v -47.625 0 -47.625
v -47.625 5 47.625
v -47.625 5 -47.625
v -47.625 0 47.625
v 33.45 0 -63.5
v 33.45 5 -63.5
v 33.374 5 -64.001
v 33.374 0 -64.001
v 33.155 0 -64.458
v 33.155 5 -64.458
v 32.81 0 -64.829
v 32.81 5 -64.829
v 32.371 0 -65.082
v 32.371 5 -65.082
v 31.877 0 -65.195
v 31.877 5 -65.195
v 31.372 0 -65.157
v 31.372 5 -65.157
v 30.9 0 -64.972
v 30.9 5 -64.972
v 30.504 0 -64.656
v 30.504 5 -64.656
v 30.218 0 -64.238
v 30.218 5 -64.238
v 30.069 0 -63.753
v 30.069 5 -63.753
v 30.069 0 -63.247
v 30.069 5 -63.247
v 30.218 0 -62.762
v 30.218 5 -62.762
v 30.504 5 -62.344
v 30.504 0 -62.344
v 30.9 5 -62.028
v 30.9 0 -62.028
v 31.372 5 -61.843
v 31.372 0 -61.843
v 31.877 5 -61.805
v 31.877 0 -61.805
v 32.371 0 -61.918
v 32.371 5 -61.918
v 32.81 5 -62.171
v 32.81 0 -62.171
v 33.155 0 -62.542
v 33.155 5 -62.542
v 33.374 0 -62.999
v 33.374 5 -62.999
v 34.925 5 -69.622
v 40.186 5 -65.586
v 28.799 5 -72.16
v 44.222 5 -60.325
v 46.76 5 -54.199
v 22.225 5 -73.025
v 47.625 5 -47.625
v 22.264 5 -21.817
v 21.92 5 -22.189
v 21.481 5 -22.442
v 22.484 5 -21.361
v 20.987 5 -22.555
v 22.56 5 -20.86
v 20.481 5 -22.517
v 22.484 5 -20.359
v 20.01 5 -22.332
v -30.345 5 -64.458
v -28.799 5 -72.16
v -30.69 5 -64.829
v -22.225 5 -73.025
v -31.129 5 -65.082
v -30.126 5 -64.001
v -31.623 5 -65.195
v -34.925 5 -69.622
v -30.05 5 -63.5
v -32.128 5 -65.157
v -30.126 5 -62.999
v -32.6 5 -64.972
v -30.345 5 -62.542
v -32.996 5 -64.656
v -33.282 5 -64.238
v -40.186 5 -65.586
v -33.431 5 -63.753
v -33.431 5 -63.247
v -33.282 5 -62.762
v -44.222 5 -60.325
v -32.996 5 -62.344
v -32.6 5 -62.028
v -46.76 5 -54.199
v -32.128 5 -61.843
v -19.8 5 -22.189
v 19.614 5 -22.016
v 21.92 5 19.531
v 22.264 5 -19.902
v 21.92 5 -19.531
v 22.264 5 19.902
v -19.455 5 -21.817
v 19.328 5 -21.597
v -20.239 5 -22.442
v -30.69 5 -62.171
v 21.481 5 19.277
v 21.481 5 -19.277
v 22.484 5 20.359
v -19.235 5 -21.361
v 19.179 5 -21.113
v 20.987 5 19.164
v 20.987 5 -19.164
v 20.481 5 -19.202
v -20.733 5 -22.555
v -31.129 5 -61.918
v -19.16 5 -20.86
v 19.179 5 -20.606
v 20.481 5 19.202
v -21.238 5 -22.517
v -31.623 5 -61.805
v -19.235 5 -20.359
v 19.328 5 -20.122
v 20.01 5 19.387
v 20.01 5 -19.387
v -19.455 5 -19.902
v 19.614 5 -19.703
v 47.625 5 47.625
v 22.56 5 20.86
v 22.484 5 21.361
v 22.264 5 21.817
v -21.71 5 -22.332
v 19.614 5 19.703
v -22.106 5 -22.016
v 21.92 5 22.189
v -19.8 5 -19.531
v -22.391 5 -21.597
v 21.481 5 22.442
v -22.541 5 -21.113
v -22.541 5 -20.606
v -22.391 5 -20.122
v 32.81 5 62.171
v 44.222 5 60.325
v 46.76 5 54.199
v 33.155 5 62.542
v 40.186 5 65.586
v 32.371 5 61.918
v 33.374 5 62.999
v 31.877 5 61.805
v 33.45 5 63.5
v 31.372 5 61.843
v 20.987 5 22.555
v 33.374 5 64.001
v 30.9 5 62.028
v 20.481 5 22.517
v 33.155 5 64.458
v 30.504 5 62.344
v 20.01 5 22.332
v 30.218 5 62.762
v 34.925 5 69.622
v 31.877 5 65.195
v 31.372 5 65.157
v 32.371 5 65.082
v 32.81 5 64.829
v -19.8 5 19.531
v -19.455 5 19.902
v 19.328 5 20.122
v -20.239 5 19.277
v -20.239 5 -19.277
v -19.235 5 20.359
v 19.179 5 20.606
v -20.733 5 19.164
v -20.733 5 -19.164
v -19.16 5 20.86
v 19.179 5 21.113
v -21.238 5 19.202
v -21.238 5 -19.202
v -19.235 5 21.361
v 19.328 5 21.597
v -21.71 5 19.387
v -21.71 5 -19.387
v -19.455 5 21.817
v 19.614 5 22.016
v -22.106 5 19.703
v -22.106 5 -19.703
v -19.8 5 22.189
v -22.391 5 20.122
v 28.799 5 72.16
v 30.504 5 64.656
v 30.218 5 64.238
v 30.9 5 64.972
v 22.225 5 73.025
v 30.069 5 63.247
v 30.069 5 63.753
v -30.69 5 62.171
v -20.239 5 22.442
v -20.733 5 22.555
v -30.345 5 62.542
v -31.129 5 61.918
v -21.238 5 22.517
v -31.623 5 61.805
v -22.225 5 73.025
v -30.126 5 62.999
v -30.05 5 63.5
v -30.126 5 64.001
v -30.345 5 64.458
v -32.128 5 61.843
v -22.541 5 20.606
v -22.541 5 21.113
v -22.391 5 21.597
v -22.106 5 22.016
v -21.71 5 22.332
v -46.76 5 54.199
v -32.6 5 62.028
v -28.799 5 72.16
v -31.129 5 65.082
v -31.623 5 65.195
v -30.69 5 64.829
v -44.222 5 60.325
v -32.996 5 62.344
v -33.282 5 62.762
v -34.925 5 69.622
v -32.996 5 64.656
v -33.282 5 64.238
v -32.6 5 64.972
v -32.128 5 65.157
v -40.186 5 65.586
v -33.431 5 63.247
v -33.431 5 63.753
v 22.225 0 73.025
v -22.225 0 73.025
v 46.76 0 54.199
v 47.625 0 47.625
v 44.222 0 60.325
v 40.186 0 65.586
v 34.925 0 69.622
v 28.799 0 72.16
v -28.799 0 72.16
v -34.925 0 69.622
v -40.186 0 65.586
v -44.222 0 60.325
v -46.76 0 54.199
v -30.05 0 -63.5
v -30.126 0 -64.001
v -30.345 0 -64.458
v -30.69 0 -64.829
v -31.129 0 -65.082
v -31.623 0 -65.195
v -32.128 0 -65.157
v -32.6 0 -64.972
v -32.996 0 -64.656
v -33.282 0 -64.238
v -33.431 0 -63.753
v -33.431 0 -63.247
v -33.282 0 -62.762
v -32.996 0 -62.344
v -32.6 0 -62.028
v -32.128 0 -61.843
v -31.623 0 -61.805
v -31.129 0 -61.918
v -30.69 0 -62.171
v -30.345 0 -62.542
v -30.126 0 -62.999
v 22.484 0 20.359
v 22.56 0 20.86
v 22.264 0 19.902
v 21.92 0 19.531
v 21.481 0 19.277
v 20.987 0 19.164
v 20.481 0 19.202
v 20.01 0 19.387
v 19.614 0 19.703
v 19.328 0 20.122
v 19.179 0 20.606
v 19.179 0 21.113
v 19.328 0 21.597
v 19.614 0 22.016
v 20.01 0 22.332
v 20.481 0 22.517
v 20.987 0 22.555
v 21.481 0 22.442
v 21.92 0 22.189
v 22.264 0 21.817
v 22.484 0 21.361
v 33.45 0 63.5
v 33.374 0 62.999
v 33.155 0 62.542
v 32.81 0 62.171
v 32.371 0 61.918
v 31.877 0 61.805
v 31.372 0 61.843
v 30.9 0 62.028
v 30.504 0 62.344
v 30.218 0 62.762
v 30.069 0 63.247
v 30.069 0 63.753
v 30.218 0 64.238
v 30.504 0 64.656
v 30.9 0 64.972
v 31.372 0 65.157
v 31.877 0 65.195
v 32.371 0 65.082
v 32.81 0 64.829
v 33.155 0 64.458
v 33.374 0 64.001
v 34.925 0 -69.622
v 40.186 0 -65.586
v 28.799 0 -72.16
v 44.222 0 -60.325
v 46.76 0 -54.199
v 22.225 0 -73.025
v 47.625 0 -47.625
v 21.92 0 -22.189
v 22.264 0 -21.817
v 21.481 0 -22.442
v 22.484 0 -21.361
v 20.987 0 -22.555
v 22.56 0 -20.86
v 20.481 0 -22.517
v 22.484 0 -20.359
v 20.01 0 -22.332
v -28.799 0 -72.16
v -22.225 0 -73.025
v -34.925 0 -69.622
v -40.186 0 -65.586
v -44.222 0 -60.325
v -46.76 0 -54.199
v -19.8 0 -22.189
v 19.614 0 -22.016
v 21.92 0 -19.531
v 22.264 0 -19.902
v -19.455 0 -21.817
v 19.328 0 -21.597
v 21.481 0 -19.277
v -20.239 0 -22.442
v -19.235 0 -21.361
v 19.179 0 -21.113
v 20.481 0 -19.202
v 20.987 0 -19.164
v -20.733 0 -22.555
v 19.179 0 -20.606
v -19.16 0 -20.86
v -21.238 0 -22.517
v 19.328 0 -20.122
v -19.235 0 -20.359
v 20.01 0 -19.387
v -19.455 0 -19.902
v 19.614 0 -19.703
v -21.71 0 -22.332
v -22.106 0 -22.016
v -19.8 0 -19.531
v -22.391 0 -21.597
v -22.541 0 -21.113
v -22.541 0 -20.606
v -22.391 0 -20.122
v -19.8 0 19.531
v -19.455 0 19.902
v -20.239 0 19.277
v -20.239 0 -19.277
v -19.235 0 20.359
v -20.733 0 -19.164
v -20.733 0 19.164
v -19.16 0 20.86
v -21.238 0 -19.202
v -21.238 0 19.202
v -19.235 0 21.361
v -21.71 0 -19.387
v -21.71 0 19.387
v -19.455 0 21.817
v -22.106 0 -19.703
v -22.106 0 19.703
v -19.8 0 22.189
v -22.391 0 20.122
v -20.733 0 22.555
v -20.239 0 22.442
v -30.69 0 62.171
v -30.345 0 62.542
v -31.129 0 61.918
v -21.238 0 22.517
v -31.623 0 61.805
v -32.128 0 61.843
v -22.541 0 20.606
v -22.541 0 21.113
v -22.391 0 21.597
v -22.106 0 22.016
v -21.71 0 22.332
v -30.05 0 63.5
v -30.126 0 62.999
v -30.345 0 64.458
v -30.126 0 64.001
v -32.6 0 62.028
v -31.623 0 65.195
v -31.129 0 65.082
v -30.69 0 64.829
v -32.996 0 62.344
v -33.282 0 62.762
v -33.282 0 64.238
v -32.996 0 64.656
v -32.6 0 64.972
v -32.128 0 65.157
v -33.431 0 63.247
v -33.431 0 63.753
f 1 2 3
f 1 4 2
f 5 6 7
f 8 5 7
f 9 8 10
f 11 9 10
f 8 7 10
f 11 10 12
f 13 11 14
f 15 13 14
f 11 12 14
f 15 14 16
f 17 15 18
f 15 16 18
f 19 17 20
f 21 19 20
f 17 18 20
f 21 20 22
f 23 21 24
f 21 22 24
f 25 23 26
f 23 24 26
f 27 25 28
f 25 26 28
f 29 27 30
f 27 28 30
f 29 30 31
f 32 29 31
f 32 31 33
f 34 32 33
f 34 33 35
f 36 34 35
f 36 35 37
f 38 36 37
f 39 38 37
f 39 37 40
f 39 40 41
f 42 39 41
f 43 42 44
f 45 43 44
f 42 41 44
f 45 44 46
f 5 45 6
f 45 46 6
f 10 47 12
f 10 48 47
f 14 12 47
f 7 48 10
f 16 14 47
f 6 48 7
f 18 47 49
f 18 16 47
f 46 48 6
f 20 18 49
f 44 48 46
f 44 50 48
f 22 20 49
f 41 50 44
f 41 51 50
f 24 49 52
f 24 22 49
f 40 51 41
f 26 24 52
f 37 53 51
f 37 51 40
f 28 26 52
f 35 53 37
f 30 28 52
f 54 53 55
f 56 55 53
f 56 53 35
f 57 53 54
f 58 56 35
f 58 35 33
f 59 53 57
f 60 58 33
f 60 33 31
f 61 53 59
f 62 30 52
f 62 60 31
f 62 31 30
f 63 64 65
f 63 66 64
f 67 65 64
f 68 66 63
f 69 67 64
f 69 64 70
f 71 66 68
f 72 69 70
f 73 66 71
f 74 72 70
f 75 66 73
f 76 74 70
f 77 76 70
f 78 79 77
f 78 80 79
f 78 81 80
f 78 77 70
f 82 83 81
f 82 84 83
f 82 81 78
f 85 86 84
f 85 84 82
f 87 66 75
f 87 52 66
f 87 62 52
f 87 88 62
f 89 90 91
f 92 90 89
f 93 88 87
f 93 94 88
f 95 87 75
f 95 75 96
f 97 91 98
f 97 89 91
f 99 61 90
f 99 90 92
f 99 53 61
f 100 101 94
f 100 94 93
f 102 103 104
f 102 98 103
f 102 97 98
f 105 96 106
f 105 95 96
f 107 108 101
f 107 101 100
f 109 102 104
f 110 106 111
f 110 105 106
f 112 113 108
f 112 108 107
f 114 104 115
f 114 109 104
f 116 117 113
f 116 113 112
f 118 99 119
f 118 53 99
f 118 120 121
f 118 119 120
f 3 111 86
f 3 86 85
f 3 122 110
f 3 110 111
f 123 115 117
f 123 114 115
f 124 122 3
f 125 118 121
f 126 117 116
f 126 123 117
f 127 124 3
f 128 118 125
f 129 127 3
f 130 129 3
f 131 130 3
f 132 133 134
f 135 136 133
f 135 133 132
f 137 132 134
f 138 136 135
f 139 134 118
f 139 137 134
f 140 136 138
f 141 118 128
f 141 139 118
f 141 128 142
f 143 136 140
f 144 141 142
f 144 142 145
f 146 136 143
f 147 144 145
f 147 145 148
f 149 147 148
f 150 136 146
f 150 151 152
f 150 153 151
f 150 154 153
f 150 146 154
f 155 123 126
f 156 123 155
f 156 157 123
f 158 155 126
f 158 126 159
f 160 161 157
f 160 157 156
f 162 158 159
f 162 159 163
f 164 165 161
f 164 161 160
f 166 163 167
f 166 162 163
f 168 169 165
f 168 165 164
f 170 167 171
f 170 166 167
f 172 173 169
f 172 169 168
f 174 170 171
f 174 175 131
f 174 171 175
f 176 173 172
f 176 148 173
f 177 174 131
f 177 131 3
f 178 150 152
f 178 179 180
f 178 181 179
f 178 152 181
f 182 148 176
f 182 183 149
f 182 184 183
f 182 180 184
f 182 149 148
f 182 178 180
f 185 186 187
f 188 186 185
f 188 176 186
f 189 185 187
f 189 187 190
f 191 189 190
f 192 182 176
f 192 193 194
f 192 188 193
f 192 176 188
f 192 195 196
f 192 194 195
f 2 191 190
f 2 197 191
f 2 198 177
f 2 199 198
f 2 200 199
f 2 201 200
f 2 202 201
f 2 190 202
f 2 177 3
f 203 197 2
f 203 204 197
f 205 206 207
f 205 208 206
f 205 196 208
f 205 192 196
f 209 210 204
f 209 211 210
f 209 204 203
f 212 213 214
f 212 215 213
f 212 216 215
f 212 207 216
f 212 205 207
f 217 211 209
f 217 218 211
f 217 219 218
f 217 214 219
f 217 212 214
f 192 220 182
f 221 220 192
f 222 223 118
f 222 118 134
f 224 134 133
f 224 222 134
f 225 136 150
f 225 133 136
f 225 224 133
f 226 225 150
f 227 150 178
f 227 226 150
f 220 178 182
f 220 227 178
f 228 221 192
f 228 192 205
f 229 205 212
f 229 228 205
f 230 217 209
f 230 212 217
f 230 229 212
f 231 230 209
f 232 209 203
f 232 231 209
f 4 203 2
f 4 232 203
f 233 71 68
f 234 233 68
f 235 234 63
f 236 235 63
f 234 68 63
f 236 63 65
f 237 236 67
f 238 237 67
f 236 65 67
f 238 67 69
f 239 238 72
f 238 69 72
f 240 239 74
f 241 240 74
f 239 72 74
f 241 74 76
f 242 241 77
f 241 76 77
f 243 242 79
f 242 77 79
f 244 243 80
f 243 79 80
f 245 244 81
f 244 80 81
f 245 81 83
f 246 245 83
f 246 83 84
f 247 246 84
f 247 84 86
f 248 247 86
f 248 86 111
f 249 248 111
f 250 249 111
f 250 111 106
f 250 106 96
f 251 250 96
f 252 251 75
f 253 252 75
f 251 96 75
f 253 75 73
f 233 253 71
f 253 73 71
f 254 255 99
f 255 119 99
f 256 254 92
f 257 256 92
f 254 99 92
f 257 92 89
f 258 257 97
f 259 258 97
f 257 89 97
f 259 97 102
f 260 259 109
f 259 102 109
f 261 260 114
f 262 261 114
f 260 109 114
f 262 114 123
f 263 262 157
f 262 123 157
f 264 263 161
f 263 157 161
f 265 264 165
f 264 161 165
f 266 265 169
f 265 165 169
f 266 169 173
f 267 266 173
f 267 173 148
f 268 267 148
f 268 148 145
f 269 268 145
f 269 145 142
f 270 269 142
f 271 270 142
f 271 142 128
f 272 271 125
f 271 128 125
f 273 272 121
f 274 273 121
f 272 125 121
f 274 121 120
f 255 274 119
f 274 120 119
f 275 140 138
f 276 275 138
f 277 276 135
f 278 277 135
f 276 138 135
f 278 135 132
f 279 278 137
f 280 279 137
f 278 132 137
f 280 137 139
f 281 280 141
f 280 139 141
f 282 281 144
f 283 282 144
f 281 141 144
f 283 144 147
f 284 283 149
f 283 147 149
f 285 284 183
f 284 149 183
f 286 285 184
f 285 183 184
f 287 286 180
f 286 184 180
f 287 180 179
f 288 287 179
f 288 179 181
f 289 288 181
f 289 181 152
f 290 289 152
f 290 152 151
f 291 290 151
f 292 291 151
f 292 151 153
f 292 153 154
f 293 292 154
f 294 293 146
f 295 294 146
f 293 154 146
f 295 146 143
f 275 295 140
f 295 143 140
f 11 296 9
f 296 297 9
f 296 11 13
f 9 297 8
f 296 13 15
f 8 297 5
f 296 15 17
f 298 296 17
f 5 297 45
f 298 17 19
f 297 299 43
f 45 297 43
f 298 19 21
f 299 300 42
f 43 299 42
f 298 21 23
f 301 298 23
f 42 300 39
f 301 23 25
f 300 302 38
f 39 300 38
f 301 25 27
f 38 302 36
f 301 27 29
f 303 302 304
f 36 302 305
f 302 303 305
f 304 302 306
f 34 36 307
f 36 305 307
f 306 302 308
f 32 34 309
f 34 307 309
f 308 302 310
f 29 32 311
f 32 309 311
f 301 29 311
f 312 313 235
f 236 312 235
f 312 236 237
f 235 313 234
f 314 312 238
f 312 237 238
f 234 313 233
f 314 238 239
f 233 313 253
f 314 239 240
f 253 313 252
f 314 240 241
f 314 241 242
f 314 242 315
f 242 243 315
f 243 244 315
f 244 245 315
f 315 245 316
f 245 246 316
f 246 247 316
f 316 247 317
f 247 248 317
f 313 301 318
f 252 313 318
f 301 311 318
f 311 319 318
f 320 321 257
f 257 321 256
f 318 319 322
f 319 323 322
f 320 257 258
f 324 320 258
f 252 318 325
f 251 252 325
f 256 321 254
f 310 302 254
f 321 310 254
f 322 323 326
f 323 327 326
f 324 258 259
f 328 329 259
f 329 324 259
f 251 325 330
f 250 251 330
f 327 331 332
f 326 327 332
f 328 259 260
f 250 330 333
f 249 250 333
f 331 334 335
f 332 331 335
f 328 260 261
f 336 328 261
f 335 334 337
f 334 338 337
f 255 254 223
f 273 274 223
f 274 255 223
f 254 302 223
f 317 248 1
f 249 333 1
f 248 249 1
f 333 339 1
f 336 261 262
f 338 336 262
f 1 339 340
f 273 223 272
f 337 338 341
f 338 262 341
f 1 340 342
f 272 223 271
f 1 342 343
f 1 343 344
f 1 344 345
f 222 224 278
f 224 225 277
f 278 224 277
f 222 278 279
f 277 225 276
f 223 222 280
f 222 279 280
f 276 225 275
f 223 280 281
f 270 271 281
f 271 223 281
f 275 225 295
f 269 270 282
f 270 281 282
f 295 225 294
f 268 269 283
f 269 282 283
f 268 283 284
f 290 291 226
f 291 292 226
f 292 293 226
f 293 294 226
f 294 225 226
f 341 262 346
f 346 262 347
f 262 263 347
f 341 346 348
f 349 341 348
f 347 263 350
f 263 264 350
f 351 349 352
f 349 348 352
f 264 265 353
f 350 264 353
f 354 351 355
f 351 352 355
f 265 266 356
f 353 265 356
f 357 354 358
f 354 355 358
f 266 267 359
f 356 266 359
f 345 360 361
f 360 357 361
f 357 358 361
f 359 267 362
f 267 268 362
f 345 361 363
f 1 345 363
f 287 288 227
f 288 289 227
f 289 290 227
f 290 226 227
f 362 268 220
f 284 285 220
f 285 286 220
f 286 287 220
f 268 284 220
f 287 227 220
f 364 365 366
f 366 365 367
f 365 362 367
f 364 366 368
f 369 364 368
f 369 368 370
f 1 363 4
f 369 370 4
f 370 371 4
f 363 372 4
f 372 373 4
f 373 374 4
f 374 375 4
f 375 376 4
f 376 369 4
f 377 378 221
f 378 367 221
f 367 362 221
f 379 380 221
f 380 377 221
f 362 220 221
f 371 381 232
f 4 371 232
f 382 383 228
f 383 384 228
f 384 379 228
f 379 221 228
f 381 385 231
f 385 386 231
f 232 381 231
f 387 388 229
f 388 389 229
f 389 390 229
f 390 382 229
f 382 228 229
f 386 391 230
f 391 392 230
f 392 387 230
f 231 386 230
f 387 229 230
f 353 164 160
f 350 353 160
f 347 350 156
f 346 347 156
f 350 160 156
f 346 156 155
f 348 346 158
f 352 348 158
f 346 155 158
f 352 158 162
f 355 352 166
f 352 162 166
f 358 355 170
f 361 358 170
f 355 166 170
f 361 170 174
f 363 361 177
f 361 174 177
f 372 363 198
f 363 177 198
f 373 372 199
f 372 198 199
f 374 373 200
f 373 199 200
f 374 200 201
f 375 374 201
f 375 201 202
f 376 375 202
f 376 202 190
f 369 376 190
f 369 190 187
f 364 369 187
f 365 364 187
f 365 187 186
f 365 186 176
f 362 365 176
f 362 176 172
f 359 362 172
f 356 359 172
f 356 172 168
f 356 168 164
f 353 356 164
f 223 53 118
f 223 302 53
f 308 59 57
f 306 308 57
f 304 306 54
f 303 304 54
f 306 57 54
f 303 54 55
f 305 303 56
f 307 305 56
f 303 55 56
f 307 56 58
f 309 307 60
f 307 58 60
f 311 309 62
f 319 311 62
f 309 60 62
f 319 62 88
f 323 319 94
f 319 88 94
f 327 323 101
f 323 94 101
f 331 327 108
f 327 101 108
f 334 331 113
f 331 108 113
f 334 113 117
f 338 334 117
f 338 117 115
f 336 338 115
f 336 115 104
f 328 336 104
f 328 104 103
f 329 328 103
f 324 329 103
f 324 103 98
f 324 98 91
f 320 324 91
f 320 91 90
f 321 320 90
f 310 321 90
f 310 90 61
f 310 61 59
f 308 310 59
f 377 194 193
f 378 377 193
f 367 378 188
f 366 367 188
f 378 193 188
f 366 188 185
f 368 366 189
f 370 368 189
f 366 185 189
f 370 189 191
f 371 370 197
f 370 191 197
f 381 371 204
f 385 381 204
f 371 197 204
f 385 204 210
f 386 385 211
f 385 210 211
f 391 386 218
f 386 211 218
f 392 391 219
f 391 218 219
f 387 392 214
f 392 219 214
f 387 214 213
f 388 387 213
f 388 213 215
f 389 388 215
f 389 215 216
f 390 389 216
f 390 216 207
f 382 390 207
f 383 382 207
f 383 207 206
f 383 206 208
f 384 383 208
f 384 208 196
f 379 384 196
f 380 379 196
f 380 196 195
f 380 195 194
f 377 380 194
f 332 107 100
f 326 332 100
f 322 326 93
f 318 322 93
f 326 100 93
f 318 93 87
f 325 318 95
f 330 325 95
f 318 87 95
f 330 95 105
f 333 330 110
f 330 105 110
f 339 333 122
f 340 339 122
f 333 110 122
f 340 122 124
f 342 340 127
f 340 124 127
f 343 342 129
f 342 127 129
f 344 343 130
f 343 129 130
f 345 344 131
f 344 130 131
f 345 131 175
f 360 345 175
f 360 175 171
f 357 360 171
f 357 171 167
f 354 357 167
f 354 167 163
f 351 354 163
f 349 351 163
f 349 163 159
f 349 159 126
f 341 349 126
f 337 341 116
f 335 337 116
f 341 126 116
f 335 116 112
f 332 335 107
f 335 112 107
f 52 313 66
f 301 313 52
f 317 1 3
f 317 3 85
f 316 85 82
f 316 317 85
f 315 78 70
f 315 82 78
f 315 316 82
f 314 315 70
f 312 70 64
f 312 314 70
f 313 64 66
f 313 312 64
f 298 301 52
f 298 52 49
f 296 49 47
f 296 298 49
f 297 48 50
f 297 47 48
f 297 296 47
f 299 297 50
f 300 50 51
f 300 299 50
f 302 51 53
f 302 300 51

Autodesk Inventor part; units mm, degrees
ref_plane "YZ Plane" through (0, 0, 0) normal (1, 0, 0) x (0, 1, 0)
ref_plane "XZ Plane" through (0, 0, 0) normal (0, 1, 0) x (-1, 0, 0)
ref_plane "XY Plane" through (0, 0, 0) normal (0, 0, 1) x (1, 0, 0)
sketch "Sketch1" plane through (0, 0, 0) normal (0, 1, 0) x (-1, 0, 0)
  line L0 (-22.225, 73.025) -> (22.225, 73.025)
  line L1 (47.625, 47.625) -> (47.625, -47.625)
  line L2 (22.225, -73.025) -> (-22.225, -73.025)
  line L3 (-47.625, -47.625) -> (-47.625, 47.625)
  line L4 (-47.625, 73.025) -> (47.625, -73.025) construction
  line L5 (47.625, 73.025) -> (-47.625, -73.025) construction
  arc A0 (22.225, -73.025) -> (47.625, -47.625) centre (22.225, -47.625) ccw
  arc A1 (-47.625, -47.625) -> (-22.225, -73.025) centre (-22.225, -47.625) ccw
  arc A2 (-22.225, 73.025) -> (-47.625, 47.625) centre (-22.225, 47.625) ccw
  arc A3 (47.625, 47.625) -> (22.225, 73.025) centre (22.225, 47.625) ccw
  point P0 (0, 0)
  dimension "d11" = 95.25
  dimension "d12" = 146.05
  dimension "d13" = 25.4
extrude "Extrusion1" add sketch "Sketch1" along normal blind 5
sketch "Sketch3" plane through (0, 5, 0) normal (0, 1, 0) x (1, 0, 0)
  circle A0 centre (-31.75, -63.5) radius 1.7
  line L0 (-47.625, 47.625) -> (-47.625, -47.625) construction
  line L1 (-47.625, 0) -> (47.625, 0) construction
  line L2 (47.625, -47.625) -> (47.625, 47.625) construction
  line L3 (0, -72.5867) -> (0, 73.025) construction
  line L4 (22.225, 73.025) -> (-22.225, 73.025) construction
  circle A1 centre (-31.75, 63.5) radius 1.7
  circle A2 centre (31.75, -63.5) radius 1.7
  circle A3 centre (31.75, 63.5) radius 1.7
  point P0 (0, 0)
  dimension "d14" = 3.4
  dimension "d15" = 63.5
  dimension "d16" = 31.75
extrude "Standoffs" cut sketch "Sketch3" against normal through all
sketch "Sketch4" plane through (0, 5, 0) normal (0, 1, 0) x (1, 0, 0)
  circle A0 centre (-20.8597, -20.8597) radius 1.7
  line L0 (-47.625, 47.625) -> (-47.625, -47.625) construction
  line L1 (-47.625, 0) -> (47.625, 0) construction
  line L2 (47.625, -47.625) -> (47.625, 47.625) construction
  line L3 (-22.225, -73.025) -> (22.225, -73.025) construction
  line L4 (0, -73.025) -> (0, 73.025) construction
  line L5 (22.225, 73.025) -> (-22.225, 73.025) construction
  line L6 (-20.8597, -20.8597) -> (0, 0) construction
  circle A1 centre (-20.8597, 20.8597) radius 1.7
  circle A2 centre (20.8597, -20.8597) radius 1.7
  circle A3 centre (20.8597, 20.8597) radius 1.7
  dimension "d19" = 3.4
  dimension "d20" = 45
  dimension "d21" = 29.5
extrude "LiDAR Mounts" cut sketch "Sketch4" against normal through all
equation "\"d3\" = hardboard_thickness"
equation "\"d14\" = m3_clearance"
equation "\"d19\" = m3_clearance"
equation "\"m3_heat_set_insert\" = 4"
equation "\"m3_clearance\" = 3.4"
equation "\"m3_heat_set_depth\" = 7"
equation "\"robot_diameter\" = 354"
equation "\"hardboard_thickness\" = 5"
properties part number "LiDAR_plate"
